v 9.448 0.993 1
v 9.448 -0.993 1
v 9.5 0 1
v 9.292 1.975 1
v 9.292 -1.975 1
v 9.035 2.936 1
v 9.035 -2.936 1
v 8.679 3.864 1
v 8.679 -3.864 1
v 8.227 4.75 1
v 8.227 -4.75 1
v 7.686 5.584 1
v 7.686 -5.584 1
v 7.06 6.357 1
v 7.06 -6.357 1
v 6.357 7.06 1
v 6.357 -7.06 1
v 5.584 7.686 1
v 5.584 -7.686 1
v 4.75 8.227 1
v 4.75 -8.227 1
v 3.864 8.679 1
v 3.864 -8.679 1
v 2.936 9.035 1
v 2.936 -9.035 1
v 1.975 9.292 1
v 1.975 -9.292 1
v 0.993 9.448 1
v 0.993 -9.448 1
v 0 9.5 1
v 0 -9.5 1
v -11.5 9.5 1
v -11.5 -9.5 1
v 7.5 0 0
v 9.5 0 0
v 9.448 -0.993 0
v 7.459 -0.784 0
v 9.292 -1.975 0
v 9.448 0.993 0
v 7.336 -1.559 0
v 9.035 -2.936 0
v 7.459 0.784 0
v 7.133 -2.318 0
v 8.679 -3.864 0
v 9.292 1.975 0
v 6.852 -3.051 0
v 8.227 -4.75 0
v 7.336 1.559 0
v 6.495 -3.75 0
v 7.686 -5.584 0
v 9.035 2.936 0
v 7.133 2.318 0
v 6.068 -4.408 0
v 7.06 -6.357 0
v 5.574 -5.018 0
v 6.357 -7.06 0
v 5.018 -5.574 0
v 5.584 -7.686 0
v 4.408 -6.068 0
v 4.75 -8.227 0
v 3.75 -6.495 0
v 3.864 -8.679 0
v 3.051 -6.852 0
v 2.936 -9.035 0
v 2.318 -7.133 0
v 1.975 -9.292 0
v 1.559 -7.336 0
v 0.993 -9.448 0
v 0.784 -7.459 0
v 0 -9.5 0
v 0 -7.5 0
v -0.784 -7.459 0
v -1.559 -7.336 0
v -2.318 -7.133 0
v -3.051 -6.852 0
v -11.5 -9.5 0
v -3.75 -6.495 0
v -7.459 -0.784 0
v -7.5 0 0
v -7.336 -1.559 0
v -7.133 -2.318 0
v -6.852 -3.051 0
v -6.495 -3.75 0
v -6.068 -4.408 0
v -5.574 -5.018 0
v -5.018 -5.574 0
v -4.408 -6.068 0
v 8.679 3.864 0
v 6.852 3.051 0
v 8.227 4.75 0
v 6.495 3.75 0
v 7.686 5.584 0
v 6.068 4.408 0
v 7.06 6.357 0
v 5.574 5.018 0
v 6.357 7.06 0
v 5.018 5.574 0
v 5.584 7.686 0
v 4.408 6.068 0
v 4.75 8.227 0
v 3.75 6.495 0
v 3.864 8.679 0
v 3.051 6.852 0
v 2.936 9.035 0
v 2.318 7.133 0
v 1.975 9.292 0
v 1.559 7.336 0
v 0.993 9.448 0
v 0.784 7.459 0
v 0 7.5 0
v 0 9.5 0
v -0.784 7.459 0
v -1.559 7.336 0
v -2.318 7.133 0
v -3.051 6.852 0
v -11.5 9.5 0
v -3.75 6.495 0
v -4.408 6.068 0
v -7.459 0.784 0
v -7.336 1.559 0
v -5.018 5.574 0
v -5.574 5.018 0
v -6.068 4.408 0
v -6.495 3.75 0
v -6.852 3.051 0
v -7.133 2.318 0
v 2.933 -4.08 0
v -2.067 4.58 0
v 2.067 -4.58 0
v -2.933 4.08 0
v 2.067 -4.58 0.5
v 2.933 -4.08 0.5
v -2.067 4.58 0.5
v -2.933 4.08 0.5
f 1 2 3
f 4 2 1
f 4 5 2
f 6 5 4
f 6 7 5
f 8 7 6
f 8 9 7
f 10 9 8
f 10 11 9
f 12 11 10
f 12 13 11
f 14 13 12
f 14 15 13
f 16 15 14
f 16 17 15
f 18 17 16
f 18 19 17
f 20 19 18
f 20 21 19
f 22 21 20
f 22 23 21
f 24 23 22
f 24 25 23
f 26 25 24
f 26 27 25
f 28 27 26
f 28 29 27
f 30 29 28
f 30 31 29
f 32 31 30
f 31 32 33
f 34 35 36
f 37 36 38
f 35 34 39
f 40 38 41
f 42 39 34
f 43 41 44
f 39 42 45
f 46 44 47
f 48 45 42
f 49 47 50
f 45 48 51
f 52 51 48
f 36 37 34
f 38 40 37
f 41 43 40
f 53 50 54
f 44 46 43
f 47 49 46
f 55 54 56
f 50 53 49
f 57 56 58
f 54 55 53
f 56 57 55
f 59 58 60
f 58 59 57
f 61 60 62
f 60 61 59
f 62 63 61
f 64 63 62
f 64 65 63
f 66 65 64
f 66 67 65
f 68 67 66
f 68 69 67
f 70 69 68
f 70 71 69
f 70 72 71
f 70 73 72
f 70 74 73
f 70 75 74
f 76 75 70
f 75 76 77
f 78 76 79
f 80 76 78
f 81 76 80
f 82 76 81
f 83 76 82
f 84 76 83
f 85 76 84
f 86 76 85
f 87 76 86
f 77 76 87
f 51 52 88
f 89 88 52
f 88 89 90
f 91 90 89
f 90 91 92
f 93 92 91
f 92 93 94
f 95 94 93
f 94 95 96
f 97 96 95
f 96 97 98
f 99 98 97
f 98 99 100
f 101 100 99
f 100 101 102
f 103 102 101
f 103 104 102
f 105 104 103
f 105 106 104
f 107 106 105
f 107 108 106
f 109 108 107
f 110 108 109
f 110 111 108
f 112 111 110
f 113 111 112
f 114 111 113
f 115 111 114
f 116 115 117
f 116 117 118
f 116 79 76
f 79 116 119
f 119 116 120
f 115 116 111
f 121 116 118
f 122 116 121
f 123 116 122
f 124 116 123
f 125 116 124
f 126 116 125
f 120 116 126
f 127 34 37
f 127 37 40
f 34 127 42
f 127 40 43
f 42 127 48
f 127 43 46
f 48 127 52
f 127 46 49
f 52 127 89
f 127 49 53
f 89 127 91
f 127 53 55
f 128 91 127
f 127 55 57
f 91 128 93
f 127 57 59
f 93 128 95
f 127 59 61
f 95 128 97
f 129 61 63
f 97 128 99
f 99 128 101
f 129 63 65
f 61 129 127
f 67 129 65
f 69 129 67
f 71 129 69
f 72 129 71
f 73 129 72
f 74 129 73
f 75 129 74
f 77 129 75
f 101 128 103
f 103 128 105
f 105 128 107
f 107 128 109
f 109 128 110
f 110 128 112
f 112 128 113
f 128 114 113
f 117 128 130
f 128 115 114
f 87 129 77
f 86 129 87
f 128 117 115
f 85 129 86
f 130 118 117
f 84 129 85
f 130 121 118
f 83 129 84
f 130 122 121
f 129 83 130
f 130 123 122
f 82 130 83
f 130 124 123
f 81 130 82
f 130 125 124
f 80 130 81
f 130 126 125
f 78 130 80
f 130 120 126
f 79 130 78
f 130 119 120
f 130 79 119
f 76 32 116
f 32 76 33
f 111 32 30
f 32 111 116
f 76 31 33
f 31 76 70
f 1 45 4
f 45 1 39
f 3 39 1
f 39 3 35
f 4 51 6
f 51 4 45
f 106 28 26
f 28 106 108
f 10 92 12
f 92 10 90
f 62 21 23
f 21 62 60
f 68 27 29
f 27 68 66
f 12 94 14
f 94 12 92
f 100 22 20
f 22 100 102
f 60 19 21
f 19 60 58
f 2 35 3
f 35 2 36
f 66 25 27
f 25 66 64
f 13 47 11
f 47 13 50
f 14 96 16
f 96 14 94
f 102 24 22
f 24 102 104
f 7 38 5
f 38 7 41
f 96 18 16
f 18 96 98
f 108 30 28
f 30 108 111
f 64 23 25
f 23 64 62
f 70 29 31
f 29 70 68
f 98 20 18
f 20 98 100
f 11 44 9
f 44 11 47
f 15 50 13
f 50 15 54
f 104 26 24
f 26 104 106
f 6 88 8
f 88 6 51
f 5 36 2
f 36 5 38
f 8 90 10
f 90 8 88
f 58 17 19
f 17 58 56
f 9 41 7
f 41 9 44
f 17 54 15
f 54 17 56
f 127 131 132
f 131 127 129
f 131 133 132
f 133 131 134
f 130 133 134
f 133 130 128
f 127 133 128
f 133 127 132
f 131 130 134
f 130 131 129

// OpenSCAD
// PRUSA iteration3
// Bearing holders
// GNU GPL v3
// Josef Průša <iam@josefprusa.cz> and contributors
// http://www.reprap.org/wiki/Prusa_Mendel
// http://prusamendel.org

bearing_diameter = 15;

module horizontal_bearing_base(bearings=1){
 translate(v=[0,0,6]) cube(size = [24,8+bearings*25,12], center = true);	
}
module horizontal_bearing_holes(bearings=1){
 cutter_lenght = 10+bearings*25;
 one_holder_lenght = 8+25;
 holder_lenght = 8+bearings*25;
 
 // Main bearing cut
 difference(){
  translate(v=[0,0,12]) rotate(a=[90,0,0]) translate(v=[0,0,-cutter_lenght/2]) cylinder(h = cutter_lenght, r=bearing_diameter/2, $fn=50);
  // Bearing retainers
  translate(v=[0,1-holder_lenght/2,3]) cube(size = [24,6,8], center = true);
  translate(v=[0,-1+holder_lenght/2,3]) cube(size = [24,6,8], center = true);
 }
 
 // Ziptie cutouts
 ziptie_cut_ofset = 0;
 for ( i = [0 : bearings-1] ){
  // For easier positioning I move them by half of one 
  // bearing holder then add each bearign lenght and then center again
  translate(v=[0,-holder_lenght/2,0]) translate(v=[0,one_holder_lenght/2+i*25,0]) difference(){
   union(){
    translate(v=[0,2-6,12]) rotate(a=[90,0,0]) translate(v=[0,0,0]) cylinder(h = 4, r=12.5, $fn=50);
    translate(v=[0,2+6,12]) rotate(a=[90,0,0]) translate(v=[0,0,0]) cylinder(h = 4, r=12.5, $fn=50);
   }
   translate(v=[0,10,12]) rotate(a=[90,0,0]) translate(v=[0,0,0]) cylinder(h = 24, r=10, $fn=50);
  }
 }
 
}

module horizontal_bearing_test(){
 difference(){
  horizontal_bearing_base(1);
  horizontal_bearing_holes(1);
 }
 translate(v=[30,0,0]) difference(){
  horizontal_bearing_base(2);
  horizontal_bearing_holes(2);
 }
 translate(v=[60,0,0]) difference(){
  horizontal_bearing_base(3);
  horizontal_bearing_holes(3);
 }
}



thinwall = 2;
bearing_size = bearing_diameter + 2 * thinwall;

module vertical_bearing_base(height){
 translate(v=[-bearing_size/2-2,-bearing_size/2,0]) cube(size = [bearing_size/2+2,bearing_size,height], center = false);
 cylinder(h = height, r=bearing_size/2, $fn = 60);
}

module vertical_bearing_holes(height){
  translate(v=[0,0,-1]) cylinder(h = height+2, r=bearing_diameter/2, $fn = 60);
  rotate(a=[0,0,-60]) translate(v=[10,0,(height/2)+0.1]) cube(size = [10,1,height], center = true);
}

difference(){
vertical_bearing_base();
vertical_bearing_holes();
}
